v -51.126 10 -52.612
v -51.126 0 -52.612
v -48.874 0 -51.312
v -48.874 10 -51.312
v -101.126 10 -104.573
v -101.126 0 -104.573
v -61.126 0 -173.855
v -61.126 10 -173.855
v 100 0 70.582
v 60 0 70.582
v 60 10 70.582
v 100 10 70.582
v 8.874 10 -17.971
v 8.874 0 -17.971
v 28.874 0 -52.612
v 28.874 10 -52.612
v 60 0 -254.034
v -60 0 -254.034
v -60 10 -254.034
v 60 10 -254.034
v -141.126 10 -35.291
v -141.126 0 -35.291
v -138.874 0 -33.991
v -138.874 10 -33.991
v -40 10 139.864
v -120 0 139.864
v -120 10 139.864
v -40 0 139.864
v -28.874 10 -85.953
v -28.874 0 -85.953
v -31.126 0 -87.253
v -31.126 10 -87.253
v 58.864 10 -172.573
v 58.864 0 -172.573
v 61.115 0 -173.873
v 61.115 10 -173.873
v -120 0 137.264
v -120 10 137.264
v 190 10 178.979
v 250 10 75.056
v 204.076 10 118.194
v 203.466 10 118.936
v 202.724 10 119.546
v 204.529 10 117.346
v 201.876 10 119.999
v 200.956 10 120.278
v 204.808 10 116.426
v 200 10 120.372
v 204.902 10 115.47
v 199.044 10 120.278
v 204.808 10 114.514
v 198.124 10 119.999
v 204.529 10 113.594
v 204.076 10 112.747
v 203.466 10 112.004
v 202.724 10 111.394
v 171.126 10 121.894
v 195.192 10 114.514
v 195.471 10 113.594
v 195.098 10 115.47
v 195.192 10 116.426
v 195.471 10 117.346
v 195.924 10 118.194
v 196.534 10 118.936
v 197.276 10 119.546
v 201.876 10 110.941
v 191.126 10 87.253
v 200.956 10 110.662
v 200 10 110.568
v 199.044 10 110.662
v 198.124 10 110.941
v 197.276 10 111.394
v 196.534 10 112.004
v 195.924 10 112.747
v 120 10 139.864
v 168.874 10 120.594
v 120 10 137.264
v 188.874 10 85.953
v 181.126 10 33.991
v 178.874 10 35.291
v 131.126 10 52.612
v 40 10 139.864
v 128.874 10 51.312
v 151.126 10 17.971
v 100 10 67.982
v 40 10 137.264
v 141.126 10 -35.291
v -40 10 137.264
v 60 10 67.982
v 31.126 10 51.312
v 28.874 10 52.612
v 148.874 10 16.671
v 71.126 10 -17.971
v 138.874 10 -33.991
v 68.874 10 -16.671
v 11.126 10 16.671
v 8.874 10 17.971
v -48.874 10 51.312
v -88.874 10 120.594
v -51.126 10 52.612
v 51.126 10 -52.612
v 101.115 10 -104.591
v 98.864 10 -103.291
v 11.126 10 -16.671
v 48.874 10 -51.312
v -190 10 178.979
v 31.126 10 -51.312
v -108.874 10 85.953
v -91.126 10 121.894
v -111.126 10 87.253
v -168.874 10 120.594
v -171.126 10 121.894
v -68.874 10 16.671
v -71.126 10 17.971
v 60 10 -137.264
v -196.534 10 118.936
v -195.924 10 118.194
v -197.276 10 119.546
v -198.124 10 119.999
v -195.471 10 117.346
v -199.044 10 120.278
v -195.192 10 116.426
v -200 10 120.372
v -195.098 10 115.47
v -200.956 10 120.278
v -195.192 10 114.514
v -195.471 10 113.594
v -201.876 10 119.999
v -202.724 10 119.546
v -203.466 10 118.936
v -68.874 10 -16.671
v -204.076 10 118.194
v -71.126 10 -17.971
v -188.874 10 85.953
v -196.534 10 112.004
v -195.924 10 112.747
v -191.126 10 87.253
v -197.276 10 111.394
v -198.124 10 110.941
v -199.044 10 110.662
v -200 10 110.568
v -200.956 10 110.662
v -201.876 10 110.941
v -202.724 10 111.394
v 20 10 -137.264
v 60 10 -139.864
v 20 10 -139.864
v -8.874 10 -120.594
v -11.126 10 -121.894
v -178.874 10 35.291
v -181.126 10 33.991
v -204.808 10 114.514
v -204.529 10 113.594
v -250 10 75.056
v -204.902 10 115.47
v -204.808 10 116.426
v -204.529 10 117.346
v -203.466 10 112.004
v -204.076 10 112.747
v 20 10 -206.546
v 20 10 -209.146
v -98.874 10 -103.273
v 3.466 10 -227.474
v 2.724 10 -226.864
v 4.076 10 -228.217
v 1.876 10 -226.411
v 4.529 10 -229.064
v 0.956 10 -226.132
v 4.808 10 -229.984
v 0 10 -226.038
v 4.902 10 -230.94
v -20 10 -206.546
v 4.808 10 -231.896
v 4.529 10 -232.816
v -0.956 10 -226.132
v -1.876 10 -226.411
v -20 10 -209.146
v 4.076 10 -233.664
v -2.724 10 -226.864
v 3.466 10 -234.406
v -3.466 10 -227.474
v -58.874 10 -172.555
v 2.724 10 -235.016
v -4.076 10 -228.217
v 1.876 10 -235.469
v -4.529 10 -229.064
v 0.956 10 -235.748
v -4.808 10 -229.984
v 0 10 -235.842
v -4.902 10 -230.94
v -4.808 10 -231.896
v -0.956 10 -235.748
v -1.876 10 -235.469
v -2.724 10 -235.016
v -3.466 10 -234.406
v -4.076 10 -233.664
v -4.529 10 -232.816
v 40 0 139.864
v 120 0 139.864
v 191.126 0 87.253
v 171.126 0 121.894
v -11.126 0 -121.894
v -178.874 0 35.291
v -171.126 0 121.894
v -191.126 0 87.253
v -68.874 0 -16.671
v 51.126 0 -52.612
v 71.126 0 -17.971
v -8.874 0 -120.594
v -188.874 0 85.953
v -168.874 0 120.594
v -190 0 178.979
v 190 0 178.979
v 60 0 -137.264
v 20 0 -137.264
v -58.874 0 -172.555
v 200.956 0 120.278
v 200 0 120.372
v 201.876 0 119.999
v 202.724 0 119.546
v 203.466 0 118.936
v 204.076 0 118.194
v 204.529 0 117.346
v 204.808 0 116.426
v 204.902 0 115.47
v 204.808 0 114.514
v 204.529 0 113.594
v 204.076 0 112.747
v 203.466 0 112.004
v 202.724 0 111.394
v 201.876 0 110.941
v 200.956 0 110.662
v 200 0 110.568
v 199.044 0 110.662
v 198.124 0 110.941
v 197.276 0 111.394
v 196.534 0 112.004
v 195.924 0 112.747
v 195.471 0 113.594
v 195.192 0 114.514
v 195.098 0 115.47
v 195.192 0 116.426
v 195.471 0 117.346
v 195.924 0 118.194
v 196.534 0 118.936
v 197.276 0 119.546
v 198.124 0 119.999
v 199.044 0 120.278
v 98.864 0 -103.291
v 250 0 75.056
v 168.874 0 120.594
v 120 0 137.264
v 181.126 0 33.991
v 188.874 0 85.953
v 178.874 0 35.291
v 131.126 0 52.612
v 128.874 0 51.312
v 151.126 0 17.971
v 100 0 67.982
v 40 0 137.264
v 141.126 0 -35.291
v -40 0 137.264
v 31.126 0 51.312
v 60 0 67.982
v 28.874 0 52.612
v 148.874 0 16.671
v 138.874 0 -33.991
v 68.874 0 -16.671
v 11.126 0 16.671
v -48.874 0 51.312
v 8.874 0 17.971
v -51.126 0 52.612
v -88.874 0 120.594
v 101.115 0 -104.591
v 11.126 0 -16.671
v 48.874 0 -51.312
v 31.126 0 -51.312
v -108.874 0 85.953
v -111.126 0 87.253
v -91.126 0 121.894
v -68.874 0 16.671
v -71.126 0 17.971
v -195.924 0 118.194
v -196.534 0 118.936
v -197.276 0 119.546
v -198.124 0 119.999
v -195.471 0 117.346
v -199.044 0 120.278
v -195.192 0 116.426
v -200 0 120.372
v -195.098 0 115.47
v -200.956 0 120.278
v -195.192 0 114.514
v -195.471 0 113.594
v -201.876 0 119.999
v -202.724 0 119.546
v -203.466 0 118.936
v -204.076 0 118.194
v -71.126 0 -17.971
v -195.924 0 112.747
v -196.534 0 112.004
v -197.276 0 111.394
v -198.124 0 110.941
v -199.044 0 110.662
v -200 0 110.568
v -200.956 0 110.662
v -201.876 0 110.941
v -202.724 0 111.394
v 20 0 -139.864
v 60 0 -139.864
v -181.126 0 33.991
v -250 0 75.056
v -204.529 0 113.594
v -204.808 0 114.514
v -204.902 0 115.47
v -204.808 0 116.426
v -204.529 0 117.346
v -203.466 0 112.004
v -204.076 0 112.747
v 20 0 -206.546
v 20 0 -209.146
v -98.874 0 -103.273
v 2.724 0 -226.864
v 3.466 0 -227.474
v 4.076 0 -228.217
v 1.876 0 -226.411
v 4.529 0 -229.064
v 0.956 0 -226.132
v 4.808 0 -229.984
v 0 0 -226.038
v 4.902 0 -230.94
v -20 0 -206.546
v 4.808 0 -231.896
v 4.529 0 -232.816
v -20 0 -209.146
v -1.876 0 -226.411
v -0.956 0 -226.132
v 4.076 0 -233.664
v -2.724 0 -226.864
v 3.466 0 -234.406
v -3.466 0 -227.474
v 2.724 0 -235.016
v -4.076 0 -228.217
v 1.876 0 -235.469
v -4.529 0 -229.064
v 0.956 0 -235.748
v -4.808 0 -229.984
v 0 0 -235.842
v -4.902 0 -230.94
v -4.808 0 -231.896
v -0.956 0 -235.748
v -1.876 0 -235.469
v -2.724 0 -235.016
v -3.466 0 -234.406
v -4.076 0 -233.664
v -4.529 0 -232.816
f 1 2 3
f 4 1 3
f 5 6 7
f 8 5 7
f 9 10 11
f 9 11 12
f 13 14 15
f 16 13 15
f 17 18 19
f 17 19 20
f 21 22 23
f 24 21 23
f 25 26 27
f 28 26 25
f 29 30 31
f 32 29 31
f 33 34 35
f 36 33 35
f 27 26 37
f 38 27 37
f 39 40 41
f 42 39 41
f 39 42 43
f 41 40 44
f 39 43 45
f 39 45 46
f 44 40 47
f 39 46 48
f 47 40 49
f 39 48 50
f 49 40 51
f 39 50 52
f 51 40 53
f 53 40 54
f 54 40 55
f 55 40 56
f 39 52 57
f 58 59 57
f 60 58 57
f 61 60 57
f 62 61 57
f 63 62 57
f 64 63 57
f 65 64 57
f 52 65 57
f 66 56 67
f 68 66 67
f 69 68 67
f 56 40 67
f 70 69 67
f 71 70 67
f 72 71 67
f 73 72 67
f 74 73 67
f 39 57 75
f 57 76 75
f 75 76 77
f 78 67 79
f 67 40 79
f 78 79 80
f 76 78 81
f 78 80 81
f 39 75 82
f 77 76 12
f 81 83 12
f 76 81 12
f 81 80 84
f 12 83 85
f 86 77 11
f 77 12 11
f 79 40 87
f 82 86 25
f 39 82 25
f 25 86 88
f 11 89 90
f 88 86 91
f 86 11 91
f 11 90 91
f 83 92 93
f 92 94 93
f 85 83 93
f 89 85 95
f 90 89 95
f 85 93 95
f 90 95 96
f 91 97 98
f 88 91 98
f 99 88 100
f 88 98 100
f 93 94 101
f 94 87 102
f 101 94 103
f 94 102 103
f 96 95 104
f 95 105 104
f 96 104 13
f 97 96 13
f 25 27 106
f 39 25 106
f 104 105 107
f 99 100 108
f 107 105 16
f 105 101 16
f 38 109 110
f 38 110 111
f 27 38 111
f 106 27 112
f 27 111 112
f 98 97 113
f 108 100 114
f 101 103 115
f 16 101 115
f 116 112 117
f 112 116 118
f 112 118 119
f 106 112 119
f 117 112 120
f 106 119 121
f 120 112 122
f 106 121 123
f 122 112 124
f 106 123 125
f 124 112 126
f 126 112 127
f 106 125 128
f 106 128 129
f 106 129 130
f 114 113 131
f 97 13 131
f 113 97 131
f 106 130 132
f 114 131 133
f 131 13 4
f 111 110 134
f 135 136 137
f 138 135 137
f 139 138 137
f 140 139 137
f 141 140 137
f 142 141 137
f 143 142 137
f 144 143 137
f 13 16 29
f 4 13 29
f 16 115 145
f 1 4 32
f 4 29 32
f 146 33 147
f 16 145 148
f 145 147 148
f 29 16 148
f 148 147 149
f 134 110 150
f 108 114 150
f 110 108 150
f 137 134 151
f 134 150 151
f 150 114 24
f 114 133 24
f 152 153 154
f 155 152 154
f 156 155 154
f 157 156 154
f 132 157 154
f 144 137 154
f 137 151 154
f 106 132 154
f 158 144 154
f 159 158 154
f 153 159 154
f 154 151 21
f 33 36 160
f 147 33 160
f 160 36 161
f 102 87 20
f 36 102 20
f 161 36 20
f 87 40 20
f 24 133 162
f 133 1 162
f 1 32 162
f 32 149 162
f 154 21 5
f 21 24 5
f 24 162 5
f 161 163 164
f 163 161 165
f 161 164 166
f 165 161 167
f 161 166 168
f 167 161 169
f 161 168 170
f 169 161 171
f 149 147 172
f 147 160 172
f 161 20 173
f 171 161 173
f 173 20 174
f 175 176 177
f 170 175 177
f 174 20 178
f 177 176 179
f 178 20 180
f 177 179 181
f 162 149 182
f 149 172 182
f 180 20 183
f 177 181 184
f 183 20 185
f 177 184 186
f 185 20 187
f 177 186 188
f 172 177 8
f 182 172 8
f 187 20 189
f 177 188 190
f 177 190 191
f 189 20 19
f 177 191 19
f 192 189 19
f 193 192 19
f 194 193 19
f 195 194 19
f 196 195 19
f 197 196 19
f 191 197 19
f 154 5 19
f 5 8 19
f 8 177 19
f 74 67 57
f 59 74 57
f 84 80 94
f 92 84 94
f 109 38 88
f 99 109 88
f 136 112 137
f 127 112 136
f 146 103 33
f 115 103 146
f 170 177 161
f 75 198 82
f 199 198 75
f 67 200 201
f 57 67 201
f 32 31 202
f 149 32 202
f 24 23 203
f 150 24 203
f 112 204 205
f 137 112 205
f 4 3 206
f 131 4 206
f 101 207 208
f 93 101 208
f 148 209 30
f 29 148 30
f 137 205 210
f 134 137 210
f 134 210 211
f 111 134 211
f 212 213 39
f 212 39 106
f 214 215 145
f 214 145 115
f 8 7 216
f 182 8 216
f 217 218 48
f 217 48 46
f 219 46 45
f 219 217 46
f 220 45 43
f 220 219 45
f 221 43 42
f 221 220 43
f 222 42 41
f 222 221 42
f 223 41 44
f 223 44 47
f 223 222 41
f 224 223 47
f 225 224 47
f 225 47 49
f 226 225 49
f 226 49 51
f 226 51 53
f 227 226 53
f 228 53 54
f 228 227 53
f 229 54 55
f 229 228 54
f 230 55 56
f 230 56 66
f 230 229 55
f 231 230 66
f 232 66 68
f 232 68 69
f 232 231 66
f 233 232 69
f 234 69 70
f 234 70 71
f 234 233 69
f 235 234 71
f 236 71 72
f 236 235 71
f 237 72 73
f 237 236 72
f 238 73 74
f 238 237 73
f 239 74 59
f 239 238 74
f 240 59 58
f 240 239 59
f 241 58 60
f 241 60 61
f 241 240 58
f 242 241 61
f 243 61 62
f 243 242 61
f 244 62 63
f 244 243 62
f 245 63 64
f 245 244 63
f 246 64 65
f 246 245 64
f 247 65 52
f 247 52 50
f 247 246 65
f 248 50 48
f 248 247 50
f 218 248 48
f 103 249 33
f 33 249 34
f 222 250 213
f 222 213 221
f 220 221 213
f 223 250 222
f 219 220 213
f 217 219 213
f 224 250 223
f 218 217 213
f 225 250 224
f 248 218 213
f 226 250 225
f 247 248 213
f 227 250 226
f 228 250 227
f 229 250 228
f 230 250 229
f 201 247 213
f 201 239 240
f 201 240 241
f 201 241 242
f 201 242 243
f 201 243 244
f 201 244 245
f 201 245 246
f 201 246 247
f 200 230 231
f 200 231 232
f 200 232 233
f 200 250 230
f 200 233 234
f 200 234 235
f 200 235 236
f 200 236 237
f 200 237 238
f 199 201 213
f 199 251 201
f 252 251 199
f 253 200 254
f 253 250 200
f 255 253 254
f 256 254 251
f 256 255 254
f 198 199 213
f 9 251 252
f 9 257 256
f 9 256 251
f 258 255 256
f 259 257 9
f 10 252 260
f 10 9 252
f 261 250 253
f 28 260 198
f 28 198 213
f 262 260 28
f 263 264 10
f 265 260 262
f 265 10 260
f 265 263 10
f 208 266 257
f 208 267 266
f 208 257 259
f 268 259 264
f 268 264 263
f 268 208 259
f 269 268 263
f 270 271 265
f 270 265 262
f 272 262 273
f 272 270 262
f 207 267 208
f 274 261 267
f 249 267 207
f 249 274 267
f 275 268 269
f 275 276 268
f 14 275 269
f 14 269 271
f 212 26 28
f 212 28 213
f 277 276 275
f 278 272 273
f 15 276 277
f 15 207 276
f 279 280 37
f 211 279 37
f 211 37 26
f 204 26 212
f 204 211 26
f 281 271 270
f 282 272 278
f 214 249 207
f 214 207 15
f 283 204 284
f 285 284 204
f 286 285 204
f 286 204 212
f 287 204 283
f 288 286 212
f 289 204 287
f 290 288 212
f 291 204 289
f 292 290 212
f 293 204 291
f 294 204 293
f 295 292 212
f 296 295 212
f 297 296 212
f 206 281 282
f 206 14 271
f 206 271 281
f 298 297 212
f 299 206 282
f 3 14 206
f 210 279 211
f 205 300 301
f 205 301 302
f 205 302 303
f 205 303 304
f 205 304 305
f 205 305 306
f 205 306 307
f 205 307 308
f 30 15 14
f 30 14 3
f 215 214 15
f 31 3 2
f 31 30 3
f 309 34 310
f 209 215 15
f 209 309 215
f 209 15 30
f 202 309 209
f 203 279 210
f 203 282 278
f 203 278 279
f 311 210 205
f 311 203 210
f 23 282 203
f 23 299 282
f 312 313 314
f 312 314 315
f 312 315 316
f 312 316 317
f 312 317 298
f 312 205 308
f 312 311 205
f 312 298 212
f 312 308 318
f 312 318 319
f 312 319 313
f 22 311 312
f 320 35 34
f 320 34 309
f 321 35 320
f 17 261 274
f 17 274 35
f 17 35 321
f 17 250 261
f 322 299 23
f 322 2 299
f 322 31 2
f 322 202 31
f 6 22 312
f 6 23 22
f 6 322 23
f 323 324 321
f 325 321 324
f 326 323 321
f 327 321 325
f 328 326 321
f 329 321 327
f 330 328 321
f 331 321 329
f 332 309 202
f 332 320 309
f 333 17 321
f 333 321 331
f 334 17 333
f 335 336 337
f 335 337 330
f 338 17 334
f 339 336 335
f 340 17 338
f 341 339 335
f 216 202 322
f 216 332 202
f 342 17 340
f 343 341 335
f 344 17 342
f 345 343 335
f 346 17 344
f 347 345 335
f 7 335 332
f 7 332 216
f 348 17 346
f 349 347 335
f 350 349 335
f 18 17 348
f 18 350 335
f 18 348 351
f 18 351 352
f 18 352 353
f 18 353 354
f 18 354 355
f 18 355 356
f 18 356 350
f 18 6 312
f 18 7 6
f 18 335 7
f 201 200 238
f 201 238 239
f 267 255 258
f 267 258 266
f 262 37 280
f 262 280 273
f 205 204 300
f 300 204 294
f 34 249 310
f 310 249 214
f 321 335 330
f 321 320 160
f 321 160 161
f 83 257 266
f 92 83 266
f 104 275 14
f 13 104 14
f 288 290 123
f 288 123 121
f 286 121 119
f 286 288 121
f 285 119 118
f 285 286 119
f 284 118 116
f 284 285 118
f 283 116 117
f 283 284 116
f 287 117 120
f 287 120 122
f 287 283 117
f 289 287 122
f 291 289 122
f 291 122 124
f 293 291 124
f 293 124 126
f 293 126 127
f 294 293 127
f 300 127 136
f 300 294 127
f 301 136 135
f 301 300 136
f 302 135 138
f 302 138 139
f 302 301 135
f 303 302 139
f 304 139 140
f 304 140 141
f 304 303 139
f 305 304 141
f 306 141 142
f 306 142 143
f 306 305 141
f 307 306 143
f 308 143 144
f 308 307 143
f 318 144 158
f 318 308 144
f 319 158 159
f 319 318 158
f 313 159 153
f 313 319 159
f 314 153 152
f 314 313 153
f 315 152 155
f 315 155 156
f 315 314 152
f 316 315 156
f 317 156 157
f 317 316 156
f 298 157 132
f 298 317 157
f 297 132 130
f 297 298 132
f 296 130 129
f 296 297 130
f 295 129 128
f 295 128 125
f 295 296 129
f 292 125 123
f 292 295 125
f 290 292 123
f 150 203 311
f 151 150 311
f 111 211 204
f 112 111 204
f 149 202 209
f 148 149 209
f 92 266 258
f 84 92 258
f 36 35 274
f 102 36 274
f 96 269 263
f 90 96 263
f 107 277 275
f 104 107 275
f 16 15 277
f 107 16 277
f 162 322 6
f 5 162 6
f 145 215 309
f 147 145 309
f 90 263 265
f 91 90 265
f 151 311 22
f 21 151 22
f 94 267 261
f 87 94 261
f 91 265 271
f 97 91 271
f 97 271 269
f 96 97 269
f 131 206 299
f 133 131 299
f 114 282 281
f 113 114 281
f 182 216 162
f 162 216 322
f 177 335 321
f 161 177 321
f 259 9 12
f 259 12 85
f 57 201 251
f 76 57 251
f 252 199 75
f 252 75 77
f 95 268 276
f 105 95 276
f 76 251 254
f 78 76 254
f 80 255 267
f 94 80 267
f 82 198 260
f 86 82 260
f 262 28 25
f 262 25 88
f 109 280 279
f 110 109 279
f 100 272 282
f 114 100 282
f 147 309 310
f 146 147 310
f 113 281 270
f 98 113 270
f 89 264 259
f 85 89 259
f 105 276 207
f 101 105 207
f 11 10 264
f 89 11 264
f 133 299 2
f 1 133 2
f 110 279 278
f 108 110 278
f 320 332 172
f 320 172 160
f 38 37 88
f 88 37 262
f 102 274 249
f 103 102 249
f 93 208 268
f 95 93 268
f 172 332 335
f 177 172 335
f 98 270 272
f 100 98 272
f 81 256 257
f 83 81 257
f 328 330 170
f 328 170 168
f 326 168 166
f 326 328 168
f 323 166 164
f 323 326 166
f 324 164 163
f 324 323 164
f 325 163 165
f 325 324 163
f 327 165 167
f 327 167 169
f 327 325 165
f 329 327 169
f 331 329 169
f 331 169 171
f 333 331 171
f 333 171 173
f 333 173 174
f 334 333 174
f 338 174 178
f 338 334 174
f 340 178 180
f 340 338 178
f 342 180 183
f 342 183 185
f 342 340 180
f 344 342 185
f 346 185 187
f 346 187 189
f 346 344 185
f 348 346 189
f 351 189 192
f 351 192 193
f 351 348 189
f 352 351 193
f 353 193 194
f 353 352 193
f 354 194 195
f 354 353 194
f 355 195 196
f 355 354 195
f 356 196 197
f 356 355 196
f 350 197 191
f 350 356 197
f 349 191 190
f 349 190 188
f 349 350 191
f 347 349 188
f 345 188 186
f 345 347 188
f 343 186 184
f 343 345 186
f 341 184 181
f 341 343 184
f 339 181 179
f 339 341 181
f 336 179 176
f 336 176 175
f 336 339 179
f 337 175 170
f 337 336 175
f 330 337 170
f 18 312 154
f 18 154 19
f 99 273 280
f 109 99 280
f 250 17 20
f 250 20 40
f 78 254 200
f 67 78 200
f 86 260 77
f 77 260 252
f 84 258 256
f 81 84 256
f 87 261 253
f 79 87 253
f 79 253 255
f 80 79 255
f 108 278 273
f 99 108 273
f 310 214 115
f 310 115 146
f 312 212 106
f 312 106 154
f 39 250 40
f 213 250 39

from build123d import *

# Parameters (mm, degrees)
SKETCH1_R           = 4.9022
SKETCH1_W           = 40
SKETCH1_H           = 2.6
SKETCH1_W_2         = 80
BOSS_EXTRUDE4_DEPTH = 10


with BuildPart() as part:
    # Sketch1 → Boss-Extrude4 (new body)
    with BuildSketch(Plane(origin=(0, 0, 0), x_dir=(1, 0, 0), z_dir=(0, 1, 0))):
        Polygon((-60.000001624, 254.034119381), (60.000003913, 254.034119381), (250.000001144, -75.055535655), (189.999998376, -178.978582511), (-190.000001624, -178.978582511), (-250.000001624, -75.055534057), align=None)
        with Locations(Location((-200.000000812, -115.470053369, 0), (0, 0, 270))):
            Circle(SKETCH1_R, mode=Mode.SUBTRACT)
        with Locations(Location((199.99999988, -115.470053769, 0), (0, 0, 270))):
            Circle(SKETCH1_R, mode=Mode.SUBTRACT)
        with Locations(Location((5.72e-07, 230.940108145, 0), (0, 0, 270))):
            Circle(SKETCH1_R, mode=Mode.SUBTRACT)
        Polygon((-191.125833025, -87.252540378), (-188.874166975, -85.952540378), (-168.874166975, -120.59355653), (-171.125833025, -121.89355653), align=None, mode=Mode.SUBTRACT)
        with Locations((0, 207.846096908)):
            Rectangle(SKETCH1_W, SKETCH1_H, mode=Mode.SUBTRACT)
        Polygon((188.874166975, -85.952540378), (191.125833025, -87.252540378), (171.125833025, -121.89355653), (168.874166975, -120.59355653), align=None, mode=Mode.SUBTRACT)
        Polygon((148.874166975, -16.670508076), (151.125833025, -17.970508076), (131.125833025, -52.611524227), (128.874166975, -51.311524227), align=None, mode=Mode.SUBTRACT)
        Polygon((-51.125833025, 52.611524227), (-48.874166975, 51.311524227), (-68.874166975, 16.670508076), (-71.125833025, 17.970508076), align=None, mode=Mode.SUBTRACT)
        Polygon((-11.125833025, 121.89355653), (-8.874166975, 120.59355653), (-28.874166975, 85.952540378), (-31.125833025, 87.252540378), align=None, mode=Mode.SUBTRACT)
        Polygon((28.874166975, 52.611524227), (31.125833025, 51.311524227), (11.125833025, 16.670508076), (8.874166975, 17.970508076), align=None, mode=Mode.SUBTRACT)
        Polygon((-61.125833025, 173.855080757), (-58.874166975, 172.555080757), (-98.874166975, 103.273048454), (-101.125833025, 104.573048454), align=None, mode=Mode.SUBTRACT)
        Polygon((-141.125833025, 35.291016151), (-138.874166975, 33.991016151), (-178.874166975, -35.291016151), (-181.125833025, -33.991016151), align=None, mode=Mode.SUBTRACT)
        with Locations((40, 138.564064606)):
            Rectangle(SKETCH1_W, SKETCH1_H, mode=Mode.SUBTRACT)
        with Locations((80, -69.282032303)):
            Rectangle(SKETCH1_W, SKETCH1_H, mode=Mode.SUBTRACT)
        with Locations((-80, -138.564064606)):
            Rectangle(SKETCH1_W_2, SKETCH1_H, mode=Mode.SUBTRACT)
        with Locations((80, -138.564064606)):
            Rectangle(SKETCH1_W_2, SKETCH1_H, mode=Mode.SUBTRACT)
        Polygon((-111.125833025, -87.252540378), (-108.874166975, -85.952540378), (-88.874166975, -120.59355653), (-91.125833025, -121.89355653), align=None, mode=Mode.SUBTRACT)
        Polygon((-71.125833025, -17.970508076), (-68.874166975, -16.670508076), (-48.874166975, -51.311524227), (-51.125833025, -52.611524227), align=None, mode=Mode.SUBTRACT)
        Polygon((8.874166975, -17.970508076), (11.125833025, -16.670508076), (31.125833025, -51.311524227), (28.874166975, -52.611524227), align=None, mode=Mode.SUBTRACT)
        Polygon((48.874166975, 51.311524227), (51.125833025, 52.611524227), (71.125833025, 17.970508076), (68.874166975, 16.670508076), align=None, mode=Mode.SUBTRACT)
        Polygon((58.863601684, 172.573380377), (61.115267734, 173.873380377), (101.115267734, 104.591348074), (98.863601684, 103.291348074), align=None, mode=Mode.SUBTRACT)
        Polygon((138.874166975, 33.991016151), (141.125833025, 35.291016151), (181.125833025, -33.991016151), (178.874166975, -35.291016151), align=None, mode=Mode.SUBTRACT)
    extrude(amount=BOSS_EXTRUDE4_DEPTH)


solid = part.part
